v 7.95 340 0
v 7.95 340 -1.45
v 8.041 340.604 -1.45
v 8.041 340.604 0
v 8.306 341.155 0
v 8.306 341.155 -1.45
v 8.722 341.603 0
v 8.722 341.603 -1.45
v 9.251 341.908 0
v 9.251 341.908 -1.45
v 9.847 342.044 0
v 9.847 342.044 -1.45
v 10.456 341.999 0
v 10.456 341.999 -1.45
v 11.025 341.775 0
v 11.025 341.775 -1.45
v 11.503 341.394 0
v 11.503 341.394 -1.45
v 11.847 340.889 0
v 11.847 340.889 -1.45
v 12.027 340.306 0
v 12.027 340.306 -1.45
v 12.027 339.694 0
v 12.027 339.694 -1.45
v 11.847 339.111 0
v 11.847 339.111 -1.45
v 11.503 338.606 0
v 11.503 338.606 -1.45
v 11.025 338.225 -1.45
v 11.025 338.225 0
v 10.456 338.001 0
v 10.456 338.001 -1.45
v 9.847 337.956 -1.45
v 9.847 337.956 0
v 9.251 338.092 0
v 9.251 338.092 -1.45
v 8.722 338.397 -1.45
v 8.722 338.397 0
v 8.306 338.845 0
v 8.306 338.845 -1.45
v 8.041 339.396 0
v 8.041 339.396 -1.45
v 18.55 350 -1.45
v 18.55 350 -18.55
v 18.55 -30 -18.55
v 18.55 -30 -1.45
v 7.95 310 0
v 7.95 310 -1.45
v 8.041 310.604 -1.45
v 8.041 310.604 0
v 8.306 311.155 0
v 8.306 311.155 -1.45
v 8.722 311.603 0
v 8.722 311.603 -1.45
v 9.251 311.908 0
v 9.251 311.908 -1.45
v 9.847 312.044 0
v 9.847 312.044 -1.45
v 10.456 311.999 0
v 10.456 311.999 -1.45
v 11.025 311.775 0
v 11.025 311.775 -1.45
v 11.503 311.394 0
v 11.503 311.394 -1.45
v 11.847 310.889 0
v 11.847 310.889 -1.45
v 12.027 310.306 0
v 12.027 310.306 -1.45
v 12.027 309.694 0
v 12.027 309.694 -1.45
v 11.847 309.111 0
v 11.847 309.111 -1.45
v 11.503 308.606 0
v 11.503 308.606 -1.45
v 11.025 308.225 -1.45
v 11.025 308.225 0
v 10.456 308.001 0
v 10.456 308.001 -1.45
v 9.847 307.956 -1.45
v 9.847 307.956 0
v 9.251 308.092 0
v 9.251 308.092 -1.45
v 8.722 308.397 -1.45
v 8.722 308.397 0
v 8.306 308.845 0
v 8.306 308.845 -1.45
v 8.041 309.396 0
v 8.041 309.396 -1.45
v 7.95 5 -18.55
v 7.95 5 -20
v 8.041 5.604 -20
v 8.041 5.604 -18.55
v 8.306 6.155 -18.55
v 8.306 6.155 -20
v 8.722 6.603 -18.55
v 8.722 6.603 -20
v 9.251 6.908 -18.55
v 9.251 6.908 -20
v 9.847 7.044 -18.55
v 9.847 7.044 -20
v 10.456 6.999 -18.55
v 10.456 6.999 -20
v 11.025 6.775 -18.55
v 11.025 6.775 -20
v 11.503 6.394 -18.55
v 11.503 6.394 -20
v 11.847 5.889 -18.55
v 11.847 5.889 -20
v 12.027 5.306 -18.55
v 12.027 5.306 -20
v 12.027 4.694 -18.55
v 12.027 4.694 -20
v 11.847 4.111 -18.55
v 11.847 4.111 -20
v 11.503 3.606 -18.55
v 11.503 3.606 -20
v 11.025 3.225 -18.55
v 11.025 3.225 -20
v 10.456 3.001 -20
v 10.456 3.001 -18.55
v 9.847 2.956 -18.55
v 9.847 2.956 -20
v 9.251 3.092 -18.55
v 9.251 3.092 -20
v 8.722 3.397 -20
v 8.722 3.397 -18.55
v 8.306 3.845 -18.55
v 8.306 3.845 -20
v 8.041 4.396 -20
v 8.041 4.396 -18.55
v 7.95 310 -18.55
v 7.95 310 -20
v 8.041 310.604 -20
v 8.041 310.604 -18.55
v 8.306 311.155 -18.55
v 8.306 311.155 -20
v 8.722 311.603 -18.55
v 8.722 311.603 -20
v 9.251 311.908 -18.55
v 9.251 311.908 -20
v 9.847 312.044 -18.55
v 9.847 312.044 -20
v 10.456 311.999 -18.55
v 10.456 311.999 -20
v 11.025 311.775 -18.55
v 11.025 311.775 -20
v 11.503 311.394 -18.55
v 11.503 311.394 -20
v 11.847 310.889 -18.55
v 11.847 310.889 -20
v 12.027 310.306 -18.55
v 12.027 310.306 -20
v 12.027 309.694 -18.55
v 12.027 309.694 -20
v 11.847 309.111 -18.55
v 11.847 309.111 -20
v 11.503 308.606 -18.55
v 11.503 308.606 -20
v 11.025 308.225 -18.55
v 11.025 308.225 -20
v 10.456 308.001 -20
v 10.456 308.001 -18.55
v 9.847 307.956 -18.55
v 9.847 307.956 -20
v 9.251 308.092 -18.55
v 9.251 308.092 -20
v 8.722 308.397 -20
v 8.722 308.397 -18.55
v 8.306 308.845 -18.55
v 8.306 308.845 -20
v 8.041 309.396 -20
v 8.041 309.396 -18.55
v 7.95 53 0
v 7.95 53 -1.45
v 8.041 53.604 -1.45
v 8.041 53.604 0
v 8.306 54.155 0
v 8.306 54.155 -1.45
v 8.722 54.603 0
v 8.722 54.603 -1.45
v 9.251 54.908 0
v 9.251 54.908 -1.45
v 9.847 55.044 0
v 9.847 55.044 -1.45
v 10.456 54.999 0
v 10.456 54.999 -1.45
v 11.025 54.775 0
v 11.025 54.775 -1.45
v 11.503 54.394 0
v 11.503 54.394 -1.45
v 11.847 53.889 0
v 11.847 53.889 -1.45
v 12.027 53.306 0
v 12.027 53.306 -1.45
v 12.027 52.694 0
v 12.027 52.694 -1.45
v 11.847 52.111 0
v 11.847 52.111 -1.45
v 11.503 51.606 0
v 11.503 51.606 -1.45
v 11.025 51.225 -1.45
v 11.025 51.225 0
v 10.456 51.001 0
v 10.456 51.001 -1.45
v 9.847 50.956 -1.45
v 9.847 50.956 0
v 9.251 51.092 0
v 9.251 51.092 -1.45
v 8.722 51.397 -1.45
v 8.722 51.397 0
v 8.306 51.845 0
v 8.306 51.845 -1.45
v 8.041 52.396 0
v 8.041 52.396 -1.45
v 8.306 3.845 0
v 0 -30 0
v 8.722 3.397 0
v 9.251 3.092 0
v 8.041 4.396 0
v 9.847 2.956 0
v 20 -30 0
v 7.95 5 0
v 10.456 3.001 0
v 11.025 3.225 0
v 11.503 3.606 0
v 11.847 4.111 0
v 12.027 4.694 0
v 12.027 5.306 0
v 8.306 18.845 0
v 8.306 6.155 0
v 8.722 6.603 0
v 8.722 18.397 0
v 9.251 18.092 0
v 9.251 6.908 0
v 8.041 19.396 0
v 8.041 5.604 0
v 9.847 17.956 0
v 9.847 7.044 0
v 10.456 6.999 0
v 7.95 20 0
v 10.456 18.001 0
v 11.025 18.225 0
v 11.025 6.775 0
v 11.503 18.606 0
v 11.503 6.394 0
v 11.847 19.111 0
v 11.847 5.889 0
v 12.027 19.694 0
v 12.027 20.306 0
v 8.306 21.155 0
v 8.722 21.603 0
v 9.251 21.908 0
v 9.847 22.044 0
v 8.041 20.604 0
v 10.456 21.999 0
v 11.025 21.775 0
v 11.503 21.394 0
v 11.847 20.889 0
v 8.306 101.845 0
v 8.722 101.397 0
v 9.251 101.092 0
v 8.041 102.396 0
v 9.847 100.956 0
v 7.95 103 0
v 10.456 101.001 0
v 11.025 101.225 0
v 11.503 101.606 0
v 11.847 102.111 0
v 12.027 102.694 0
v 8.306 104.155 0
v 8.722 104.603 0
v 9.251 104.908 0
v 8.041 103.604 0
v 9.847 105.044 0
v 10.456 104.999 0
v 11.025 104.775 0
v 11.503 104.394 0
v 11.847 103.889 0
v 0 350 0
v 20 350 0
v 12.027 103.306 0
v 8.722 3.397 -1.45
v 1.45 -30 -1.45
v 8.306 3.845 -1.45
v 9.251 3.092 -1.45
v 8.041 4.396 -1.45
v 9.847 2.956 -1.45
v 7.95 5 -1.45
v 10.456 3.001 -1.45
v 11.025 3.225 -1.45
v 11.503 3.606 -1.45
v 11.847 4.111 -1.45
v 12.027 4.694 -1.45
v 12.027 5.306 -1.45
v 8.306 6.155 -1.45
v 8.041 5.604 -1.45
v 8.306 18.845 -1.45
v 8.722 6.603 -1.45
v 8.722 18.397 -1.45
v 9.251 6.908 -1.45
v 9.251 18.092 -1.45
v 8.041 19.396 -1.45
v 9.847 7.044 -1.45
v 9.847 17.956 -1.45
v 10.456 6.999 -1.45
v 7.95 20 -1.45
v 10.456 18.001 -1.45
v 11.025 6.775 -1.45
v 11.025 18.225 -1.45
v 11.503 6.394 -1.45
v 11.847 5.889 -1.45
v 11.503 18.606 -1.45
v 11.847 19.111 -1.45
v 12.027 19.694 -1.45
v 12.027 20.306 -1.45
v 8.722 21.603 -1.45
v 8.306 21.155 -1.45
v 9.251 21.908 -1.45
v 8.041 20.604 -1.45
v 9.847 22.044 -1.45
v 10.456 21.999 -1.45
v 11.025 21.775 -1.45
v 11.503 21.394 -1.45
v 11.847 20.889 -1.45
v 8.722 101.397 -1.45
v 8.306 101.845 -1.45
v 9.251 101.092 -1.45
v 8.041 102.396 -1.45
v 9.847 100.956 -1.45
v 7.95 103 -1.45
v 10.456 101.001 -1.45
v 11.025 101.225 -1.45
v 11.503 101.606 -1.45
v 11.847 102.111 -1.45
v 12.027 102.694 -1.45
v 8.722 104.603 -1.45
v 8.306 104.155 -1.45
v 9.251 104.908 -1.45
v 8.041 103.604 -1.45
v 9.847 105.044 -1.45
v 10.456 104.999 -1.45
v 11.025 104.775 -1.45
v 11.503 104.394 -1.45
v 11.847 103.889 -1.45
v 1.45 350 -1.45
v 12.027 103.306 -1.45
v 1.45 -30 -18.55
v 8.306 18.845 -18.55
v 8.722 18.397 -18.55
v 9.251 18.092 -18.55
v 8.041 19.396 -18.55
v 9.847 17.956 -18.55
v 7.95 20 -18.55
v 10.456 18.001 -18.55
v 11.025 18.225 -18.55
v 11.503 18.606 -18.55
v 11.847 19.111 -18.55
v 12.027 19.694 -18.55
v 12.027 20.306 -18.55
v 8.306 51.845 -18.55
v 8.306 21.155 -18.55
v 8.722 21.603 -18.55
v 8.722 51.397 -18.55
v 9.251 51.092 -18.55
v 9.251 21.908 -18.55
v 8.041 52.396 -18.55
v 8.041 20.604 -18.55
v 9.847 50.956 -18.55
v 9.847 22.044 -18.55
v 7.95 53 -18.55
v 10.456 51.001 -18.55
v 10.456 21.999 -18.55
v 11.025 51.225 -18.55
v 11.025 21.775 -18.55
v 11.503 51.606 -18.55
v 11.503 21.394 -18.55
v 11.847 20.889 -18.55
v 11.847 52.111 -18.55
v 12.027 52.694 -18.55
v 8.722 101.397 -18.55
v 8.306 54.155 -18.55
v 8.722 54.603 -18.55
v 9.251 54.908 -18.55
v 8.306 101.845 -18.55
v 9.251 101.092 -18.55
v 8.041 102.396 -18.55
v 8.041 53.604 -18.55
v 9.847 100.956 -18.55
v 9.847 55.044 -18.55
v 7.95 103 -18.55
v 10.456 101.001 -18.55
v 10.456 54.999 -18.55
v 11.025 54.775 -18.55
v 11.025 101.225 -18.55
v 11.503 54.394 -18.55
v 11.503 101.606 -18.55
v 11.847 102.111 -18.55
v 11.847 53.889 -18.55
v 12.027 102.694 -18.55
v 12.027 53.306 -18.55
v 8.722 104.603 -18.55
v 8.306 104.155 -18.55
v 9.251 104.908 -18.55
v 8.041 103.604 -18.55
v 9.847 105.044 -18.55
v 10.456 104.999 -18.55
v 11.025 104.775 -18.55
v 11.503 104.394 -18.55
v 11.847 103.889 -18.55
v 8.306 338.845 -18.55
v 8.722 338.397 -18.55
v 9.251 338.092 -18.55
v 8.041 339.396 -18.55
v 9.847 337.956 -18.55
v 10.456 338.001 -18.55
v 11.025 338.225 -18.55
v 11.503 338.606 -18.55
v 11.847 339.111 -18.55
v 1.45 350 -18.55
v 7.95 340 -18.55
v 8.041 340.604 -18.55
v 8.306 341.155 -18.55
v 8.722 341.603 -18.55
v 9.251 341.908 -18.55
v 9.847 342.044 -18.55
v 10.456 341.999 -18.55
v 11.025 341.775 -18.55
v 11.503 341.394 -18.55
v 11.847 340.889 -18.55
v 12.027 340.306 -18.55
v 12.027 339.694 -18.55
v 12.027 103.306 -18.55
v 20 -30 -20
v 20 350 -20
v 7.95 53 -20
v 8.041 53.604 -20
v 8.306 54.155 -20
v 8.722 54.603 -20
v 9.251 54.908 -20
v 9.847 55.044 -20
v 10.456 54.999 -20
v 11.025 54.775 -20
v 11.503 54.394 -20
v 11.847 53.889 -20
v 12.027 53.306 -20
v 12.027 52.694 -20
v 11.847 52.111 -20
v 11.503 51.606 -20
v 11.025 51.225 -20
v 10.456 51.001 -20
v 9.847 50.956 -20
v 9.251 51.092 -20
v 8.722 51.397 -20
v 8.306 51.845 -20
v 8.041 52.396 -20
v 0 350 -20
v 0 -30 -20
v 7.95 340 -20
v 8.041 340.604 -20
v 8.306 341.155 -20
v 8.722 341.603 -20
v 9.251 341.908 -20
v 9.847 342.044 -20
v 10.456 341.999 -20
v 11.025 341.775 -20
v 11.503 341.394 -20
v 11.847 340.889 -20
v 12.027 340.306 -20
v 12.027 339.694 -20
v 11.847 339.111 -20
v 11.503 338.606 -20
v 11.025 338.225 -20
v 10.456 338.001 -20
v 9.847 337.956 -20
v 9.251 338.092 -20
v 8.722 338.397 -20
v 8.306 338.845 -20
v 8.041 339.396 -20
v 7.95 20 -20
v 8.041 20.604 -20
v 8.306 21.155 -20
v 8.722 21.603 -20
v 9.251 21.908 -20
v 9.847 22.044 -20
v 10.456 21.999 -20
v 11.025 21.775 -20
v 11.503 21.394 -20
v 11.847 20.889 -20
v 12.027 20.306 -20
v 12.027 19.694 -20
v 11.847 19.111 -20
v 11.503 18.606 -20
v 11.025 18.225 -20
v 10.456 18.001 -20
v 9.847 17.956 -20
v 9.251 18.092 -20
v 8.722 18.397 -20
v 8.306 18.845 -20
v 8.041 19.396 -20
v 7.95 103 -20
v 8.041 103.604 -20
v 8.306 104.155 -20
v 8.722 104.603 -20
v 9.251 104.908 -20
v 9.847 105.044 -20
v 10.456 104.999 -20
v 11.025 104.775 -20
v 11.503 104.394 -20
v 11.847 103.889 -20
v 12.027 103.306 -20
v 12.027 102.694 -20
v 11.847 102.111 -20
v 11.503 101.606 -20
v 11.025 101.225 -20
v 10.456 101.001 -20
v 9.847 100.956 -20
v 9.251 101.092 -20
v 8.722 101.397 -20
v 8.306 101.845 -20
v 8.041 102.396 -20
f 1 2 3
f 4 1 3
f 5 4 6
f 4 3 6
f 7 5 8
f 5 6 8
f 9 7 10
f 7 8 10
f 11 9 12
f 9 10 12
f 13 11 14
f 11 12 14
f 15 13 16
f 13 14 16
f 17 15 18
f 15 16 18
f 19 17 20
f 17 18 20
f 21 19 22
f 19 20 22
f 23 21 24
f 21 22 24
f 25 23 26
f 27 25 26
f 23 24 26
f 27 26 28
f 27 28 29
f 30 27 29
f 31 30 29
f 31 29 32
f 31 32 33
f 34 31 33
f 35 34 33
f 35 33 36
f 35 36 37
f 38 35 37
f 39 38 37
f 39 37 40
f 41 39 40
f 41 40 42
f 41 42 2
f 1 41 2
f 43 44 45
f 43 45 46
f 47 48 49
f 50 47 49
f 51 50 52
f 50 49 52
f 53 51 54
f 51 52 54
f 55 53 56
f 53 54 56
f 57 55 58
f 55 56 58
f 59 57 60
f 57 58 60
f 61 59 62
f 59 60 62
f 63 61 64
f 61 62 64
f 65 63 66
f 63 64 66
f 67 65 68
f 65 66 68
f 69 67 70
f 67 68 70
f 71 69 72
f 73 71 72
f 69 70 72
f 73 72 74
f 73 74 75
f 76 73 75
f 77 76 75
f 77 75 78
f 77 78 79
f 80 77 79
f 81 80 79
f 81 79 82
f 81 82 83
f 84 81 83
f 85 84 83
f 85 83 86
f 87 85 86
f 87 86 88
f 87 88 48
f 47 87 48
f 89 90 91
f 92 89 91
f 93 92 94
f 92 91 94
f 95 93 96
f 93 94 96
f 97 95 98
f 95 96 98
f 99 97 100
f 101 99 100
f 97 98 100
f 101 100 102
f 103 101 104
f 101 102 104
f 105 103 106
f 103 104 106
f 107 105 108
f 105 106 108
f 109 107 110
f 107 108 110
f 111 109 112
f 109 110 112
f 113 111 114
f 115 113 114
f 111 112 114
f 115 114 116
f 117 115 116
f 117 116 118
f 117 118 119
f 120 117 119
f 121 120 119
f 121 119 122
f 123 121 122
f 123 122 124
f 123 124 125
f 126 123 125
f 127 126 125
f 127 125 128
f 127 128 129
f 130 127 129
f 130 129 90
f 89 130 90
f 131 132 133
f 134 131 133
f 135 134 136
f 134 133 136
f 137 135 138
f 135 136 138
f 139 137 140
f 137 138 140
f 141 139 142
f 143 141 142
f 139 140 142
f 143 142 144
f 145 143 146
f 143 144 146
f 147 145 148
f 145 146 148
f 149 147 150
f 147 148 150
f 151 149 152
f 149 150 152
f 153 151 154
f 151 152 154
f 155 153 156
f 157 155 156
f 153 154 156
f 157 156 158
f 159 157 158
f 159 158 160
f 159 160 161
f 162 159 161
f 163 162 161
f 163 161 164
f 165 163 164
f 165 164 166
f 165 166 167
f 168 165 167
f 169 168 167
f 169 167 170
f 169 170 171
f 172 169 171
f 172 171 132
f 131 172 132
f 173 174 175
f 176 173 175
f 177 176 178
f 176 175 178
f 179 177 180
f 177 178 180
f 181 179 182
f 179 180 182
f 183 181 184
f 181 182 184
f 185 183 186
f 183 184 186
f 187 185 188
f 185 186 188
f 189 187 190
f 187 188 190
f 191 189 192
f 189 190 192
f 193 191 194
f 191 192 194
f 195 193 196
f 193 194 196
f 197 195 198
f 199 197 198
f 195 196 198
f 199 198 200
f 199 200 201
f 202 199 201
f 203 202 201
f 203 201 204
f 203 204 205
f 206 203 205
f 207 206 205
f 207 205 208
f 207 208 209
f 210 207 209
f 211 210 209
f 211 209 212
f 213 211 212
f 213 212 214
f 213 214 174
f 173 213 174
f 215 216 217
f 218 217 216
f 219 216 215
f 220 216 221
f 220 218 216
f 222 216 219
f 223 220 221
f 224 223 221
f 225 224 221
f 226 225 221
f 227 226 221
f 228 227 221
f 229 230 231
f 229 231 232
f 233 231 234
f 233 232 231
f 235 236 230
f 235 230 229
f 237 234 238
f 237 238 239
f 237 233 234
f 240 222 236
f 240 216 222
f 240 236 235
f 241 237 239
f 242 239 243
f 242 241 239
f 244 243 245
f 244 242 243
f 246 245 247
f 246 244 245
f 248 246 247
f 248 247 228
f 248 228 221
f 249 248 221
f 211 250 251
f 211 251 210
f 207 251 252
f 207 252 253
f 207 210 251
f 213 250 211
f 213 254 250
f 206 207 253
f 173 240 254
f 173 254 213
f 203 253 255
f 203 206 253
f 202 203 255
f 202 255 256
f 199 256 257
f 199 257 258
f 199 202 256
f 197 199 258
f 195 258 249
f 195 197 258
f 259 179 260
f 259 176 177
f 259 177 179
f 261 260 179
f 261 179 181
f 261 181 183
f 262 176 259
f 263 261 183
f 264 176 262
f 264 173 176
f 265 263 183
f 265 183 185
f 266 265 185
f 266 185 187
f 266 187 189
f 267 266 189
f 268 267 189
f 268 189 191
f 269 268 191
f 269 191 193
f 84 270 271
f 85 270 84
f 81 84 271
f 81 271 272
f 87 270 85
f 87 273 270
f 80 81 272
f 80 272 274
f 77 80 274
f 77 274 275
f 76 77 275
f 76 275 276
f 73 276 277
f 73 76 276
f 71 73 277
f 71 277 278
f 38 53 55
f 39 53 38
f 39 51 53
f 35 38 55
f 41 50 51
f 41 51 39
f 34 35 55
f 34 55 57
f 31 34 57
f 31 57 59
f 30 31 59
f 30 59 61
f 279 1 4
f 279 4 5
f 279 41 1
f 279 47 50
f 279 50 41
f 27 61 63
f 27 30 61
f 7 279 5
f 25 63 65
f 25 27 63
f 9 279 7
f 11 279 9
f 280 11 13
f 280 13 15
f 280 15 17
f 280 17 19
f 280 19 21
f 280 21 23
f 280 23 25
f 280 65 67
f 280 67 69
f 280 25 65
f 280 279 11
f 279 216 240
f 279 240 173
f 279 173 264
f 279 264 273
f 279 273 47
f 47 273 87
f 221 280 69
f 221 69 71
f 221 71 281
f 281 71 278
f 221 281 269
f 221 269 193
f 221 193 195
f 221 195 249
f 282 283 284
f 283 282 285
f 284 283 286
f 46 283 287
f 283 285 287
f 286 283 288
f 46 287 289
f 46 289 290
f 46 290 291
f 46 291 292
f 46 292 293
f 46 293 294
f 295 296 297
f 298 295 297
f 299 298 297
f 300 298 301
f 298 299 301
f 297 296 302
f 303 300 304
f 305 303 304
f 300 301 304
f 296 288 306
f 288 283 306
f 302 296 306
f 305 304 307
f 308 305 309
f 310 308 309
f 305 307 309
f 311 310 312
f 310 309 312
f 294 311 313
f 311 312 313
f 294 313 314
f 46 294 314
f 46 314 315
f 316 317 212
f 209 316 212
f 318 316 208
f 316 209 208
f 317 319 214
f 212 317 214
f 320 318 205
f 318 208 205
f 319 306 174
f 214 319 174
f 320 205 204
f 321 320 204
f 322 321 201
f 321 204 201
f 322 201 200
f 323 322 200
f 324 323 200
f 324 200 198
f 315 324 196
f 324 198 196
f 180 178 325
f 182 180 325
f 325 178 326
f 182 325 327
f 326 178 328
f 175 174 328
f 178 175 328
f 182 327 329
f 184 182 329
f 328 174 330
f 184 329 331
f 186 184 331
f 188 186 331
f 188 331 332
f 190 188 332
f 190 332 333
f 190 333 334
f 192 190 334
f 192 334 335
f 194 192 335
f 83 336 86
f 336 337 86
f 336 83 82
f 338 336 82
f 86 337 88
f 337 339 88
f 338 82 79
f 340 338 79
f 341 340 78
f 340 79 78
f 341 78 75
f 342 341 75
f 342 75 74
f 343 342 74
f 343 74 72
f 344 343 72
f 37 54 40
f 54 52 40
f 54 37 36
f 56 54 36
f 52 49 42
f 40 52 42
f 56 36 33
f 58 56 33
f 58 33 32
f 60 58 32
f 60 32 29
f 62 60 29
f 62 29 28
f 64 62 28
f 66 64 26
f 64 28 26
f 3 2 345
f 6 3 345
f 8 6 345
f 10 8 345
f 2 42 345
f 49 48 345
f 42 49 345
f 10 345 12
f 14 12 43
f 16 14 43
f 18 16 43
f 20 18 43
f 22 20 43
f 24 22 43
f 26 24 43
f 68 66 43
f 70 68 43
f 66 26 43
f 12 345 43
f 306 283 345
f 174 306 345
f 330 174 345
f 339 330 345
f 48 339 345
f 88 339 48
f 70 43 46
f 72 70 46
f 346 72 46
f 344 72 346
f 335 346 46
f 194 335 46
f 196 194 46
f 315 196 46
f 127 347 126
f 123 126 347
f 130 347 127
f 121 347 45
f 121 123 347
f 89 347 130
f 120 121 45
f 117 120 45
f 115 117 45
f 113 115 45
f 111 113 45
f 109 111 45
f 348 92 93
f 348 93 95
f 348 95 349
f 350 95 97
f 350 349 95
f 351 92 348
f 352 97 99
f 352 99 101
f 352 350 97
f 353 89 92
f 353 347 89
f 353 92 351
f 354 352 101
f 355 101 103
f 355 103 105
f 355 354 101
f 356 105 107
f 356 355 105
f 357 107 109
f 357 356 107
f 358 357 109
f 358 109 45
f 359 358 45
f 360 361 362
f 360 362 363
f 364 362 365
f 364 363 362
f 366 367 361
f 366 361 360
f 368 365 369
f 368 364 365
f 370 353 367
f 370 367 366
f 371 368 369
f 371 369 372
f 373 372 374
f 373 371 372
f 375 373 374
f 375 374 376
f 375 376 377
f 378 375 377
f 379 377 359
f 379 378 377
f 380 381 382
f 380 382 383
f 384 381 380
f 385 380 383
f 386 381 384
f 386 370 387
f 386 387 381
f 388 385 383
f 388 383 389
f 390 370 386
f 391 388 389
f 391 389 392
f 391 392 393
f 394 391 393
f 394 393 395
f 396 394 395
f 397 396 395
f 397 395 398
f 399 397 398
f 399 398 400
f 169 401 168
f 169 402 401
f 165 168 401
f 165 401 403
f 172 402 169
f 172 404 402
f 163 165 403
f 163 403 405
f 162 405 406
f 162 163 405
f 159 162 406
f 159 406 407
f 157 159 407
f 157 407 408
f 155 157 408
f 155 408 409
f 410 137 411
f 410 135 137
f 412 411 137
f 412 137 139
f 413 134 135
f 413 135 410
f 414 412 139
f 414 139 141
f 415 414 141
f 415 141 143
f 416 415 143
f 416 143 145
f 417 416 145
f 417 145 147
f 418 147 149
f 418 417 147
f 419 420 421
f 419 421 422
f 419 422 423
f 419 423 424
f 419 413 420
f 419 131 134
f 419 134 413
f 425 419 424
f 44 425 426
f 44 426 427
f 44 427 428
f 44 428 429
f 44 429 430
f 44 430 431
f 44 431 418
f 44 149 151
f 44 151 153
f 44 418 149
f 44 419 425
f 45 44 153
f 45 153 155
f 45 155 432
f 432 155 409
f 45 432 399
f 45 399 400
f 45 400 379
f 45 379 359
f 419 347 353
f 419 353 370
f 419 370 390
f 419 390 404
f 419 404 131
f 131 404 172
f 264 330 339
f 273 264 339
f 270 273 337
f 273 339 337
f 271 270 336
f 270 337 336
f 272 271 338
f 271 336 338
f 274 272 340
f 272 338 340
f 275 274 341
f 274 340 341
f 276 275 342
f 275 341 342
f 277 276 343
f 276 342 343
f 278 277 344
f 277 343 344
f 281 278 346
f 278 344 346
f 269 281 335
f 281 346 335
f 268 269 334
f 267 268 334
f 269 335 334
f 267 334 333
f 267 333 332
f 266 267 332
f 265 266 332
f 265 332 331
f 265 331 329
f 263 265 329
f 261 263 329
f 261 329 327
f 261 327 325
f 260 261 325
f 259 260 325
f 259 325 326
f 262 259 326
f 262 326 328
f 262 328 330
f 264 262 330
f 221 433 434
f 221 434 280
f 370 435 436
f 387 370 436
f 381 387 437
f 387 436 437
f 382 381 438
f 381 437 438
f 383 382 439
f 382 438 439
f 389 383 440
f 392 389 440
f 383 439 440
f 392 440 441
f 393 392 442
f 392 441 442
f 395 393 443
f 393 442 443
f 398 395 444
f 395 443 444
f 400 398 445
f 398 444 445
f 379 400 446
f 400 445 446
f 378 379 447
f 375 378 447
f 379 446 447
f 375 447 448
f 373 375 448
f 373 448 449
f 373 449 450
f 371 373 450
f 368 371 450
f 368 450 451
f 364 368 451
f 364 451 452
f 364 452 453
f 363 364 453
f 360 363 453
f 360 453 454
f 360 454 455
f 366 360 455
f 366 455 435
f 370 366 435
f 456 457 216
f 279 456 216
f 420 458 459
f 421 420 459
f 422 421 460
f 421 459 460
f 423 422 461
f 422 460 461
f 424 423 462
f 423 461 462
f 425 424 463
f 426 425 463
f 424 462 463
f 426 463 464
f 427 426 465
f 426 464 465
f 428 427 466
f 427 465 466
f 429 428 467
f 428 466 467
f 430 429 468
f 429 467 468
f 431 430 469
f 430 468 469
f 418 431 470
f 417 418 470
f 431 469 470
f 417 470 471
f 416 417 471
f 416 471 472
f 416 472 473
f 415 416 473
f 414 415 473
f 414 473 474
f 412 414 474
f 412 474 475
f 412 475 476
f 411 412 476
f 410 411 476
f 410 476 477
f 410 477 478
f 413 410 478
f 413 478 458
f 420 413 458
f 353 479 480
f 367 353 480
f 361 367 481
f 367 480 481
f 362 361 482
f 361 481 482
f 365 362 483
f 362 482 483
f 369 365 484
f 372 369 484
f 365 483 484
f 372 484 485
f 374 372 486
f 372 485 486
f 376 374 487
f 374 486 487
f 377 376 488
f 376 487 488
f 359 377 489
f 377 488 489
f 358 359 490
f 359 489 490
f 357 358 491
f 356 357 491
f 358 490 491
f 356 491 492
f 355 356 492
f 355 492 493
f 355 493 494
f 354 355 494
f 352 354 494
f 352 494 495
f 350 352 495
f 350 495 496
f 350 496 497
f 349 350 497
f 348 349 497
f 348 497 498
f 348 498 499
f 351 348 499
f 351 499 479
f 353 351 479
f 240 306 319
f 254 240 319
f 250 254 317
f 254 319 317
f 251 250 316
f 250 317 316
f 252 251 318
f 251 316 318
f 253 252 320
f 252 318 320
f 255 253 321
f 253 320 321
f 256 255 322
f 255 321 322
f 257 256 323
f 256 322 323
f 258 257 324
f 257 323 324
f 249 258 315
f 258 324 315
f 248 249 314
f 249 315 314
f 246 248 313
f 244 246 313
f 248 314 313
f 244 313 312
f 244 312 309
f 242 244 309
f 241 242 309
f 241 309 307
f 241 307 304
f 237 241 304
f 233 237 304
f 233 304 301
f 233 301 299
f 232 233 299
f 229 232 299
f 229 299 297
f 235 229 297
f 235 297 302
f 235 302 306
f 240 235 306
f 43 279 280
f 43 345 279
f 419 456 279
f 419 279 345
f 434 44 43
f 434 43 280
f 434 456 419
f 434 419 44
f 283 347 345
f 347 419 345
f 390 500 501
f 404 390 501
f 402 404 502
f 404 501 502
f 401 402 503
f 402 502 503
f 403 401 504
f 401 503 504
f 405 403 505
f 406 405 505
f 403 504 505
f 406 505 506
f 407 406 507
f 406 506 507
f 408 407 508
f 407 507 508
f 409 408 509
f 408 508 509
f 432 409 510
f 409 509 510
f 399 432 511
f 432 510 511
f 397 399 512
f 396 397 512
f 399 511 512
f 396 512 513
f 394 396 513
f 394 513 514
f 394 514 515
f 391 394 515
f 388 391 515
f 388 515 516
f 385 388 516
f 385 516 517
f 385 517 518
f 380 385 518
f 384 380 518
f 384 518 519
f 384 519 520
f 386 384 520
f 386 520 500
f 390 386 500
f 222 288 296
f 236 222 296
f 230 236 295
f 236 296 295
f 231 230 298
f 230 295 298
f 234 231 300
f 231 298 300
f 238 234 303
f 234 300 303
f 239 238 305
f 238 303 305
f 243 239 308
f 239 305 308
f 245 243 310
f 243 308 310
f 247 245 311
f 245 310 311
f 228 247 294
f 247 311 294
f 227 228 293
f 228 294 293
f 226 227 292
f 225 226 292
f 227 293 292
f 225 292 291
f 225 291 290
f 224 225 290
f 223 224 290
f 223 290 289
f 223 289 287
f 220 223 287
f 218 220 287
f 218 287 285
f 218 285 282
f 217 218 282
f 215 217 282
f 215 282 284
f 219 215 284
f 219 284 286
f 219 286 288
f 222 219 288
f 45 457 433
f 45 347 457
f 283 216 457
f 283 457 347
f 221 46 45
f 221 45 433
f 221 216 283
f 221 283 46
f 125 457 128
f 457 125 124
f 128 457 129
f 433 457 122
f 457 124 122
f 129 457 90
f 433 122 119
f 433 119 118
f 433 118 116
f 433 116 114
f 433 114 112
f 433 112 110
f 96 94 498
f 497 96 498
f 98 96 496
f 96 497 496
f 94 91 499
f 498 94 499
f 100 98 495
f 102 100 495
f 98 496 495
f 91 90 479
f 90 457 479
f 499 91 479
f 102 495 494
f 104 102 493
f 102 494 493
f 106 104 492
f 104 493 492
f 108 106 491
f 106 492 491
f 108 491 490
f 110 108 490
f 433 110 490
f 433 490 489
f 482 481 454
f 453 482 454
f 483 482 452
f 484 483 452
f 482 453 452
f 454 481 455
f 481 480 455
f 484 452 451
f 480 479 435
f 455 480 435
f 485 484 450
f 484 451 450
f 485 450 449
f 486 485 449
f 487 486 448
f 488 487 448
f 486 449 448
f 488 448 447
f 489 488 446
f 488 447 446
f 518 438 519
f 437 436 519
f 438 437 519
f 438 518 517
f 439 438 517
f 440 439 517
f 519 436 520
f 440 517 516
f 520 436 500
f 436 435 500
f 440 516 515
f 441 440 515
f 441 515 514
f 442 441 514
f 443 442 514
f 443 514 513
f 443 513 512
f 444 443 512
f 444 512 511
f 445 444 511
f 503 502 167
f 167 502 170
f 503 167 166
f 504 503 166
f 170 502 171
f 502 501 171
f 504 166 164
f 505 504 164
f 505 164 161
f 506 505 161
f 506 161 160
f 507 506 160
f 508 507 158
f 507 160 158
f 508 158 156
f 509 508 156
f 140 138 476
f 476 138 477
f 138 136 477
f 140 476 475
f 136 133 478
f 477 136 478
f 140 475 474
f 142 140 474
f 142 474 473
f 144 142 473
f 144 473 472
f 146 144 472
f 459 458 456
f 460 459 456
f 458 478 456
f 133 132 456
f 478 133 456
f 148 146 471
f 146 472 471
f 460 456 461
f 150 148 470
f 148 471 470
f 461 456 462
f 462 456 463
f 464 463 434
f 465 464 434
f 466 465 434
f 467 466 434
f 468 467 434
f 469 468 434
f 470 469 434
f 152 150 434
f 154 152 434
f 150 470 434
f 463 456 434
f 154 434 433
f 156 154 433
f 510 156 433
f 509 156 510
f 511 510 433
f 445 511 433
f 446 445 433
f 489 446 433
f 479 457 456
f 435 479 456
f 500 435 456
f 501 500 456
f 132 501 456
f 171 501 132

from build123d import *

# Parameters (mm, degrees)
SKETCH1_W           = 20
SKETCH1_H           = 20
SKETCH1_W_2         = 17.1
SKETCH1_H_2         = 17.1
BOSS_EXTRUDE1_DEPTH = 350
SKETCH2_R           = 2.05
CUT_EXTRUDE1_DEPTH  = 21
SKETCH3_R           = 2.05
CUT_EXTRUDE2_DEPTH  = 21
SKETCH4_W           = 20
SKETCH4_H           = 20
SKETCH4_W_2         = 17.1
SKETCH4_H_2         = 17.1
BOSS_EXTRUDE2_DEPTH = 30


with BuildPart() as part:
    # Sketch1 → Boss-Extrude1 (new body)
    with BuildSketch(Plane(origin=(0, 0, 0), x_dir=(1, 0, 0), z_dir=(0, 1, 0))):
        with Locations((10, 10)):
            Rectangle(SKETCH1_W, SKETCH1_H)
        with Locations((10, 10)):
            Rectangle(SKETCH1_W_2, SKETCH1_H_2, mode=Mode.SUBTRACT)
    extrude(amount=BOSS_EXTRUDE1_DEPTH)

    # Sketch2 → Cut-Extrude1 (cut, through all)
    with BuildSketch(Plane(origin=(0, 0, -20), x_dir=(-1, 0, 0), z_dir=(0, 0, -1))):
        with Locations((-10, 340)):
            Circle(SKETCH2_R)
        with Locations((-10, 310)):
            Circle(SKETCH2_R)
        with Locations((-10, 20)):
            Circle(SKETCH2_R)
        with Locations((-10, 5)):
            Circle(SKETCH2_R)
    extrude(amount=-CUT_EXTRUDE1_DEPTH, mode=Mode.SUBTRACT)

    # Sketch3 → Cut-Extrude2 (cut, through all)
    with BuildSketch(Plane(origin=(0, 0, -20), x_dir=(-1, 0, 0), z_dir=(0, 0, -1))):
        with Locations((-10, 103)):
            Circle(SKETCH3_R)
        with Locations((-10, 53)):
            Circle(SKETCH3_R)
    extrude(amount=-CUT_EXTRUDE2_DEPTH, mode=Mode.SUBTRACT)

    # Sketch4 → Boss-Extrude2 (add)
    with BuildSketch(Plane.XZ):
        with Locations((10, -10)):
            Rectangle(SKETCH4_W, SKETCH4_H)
        with Locations((10, -10)):
            Rectangle(SKETCH4_W_2, SKETCH4_H_2, mode=Mode.SUBTRACT)
    extrude(amount=BOSS_EXTRUDE2_DEPTH)


solid = part.part
